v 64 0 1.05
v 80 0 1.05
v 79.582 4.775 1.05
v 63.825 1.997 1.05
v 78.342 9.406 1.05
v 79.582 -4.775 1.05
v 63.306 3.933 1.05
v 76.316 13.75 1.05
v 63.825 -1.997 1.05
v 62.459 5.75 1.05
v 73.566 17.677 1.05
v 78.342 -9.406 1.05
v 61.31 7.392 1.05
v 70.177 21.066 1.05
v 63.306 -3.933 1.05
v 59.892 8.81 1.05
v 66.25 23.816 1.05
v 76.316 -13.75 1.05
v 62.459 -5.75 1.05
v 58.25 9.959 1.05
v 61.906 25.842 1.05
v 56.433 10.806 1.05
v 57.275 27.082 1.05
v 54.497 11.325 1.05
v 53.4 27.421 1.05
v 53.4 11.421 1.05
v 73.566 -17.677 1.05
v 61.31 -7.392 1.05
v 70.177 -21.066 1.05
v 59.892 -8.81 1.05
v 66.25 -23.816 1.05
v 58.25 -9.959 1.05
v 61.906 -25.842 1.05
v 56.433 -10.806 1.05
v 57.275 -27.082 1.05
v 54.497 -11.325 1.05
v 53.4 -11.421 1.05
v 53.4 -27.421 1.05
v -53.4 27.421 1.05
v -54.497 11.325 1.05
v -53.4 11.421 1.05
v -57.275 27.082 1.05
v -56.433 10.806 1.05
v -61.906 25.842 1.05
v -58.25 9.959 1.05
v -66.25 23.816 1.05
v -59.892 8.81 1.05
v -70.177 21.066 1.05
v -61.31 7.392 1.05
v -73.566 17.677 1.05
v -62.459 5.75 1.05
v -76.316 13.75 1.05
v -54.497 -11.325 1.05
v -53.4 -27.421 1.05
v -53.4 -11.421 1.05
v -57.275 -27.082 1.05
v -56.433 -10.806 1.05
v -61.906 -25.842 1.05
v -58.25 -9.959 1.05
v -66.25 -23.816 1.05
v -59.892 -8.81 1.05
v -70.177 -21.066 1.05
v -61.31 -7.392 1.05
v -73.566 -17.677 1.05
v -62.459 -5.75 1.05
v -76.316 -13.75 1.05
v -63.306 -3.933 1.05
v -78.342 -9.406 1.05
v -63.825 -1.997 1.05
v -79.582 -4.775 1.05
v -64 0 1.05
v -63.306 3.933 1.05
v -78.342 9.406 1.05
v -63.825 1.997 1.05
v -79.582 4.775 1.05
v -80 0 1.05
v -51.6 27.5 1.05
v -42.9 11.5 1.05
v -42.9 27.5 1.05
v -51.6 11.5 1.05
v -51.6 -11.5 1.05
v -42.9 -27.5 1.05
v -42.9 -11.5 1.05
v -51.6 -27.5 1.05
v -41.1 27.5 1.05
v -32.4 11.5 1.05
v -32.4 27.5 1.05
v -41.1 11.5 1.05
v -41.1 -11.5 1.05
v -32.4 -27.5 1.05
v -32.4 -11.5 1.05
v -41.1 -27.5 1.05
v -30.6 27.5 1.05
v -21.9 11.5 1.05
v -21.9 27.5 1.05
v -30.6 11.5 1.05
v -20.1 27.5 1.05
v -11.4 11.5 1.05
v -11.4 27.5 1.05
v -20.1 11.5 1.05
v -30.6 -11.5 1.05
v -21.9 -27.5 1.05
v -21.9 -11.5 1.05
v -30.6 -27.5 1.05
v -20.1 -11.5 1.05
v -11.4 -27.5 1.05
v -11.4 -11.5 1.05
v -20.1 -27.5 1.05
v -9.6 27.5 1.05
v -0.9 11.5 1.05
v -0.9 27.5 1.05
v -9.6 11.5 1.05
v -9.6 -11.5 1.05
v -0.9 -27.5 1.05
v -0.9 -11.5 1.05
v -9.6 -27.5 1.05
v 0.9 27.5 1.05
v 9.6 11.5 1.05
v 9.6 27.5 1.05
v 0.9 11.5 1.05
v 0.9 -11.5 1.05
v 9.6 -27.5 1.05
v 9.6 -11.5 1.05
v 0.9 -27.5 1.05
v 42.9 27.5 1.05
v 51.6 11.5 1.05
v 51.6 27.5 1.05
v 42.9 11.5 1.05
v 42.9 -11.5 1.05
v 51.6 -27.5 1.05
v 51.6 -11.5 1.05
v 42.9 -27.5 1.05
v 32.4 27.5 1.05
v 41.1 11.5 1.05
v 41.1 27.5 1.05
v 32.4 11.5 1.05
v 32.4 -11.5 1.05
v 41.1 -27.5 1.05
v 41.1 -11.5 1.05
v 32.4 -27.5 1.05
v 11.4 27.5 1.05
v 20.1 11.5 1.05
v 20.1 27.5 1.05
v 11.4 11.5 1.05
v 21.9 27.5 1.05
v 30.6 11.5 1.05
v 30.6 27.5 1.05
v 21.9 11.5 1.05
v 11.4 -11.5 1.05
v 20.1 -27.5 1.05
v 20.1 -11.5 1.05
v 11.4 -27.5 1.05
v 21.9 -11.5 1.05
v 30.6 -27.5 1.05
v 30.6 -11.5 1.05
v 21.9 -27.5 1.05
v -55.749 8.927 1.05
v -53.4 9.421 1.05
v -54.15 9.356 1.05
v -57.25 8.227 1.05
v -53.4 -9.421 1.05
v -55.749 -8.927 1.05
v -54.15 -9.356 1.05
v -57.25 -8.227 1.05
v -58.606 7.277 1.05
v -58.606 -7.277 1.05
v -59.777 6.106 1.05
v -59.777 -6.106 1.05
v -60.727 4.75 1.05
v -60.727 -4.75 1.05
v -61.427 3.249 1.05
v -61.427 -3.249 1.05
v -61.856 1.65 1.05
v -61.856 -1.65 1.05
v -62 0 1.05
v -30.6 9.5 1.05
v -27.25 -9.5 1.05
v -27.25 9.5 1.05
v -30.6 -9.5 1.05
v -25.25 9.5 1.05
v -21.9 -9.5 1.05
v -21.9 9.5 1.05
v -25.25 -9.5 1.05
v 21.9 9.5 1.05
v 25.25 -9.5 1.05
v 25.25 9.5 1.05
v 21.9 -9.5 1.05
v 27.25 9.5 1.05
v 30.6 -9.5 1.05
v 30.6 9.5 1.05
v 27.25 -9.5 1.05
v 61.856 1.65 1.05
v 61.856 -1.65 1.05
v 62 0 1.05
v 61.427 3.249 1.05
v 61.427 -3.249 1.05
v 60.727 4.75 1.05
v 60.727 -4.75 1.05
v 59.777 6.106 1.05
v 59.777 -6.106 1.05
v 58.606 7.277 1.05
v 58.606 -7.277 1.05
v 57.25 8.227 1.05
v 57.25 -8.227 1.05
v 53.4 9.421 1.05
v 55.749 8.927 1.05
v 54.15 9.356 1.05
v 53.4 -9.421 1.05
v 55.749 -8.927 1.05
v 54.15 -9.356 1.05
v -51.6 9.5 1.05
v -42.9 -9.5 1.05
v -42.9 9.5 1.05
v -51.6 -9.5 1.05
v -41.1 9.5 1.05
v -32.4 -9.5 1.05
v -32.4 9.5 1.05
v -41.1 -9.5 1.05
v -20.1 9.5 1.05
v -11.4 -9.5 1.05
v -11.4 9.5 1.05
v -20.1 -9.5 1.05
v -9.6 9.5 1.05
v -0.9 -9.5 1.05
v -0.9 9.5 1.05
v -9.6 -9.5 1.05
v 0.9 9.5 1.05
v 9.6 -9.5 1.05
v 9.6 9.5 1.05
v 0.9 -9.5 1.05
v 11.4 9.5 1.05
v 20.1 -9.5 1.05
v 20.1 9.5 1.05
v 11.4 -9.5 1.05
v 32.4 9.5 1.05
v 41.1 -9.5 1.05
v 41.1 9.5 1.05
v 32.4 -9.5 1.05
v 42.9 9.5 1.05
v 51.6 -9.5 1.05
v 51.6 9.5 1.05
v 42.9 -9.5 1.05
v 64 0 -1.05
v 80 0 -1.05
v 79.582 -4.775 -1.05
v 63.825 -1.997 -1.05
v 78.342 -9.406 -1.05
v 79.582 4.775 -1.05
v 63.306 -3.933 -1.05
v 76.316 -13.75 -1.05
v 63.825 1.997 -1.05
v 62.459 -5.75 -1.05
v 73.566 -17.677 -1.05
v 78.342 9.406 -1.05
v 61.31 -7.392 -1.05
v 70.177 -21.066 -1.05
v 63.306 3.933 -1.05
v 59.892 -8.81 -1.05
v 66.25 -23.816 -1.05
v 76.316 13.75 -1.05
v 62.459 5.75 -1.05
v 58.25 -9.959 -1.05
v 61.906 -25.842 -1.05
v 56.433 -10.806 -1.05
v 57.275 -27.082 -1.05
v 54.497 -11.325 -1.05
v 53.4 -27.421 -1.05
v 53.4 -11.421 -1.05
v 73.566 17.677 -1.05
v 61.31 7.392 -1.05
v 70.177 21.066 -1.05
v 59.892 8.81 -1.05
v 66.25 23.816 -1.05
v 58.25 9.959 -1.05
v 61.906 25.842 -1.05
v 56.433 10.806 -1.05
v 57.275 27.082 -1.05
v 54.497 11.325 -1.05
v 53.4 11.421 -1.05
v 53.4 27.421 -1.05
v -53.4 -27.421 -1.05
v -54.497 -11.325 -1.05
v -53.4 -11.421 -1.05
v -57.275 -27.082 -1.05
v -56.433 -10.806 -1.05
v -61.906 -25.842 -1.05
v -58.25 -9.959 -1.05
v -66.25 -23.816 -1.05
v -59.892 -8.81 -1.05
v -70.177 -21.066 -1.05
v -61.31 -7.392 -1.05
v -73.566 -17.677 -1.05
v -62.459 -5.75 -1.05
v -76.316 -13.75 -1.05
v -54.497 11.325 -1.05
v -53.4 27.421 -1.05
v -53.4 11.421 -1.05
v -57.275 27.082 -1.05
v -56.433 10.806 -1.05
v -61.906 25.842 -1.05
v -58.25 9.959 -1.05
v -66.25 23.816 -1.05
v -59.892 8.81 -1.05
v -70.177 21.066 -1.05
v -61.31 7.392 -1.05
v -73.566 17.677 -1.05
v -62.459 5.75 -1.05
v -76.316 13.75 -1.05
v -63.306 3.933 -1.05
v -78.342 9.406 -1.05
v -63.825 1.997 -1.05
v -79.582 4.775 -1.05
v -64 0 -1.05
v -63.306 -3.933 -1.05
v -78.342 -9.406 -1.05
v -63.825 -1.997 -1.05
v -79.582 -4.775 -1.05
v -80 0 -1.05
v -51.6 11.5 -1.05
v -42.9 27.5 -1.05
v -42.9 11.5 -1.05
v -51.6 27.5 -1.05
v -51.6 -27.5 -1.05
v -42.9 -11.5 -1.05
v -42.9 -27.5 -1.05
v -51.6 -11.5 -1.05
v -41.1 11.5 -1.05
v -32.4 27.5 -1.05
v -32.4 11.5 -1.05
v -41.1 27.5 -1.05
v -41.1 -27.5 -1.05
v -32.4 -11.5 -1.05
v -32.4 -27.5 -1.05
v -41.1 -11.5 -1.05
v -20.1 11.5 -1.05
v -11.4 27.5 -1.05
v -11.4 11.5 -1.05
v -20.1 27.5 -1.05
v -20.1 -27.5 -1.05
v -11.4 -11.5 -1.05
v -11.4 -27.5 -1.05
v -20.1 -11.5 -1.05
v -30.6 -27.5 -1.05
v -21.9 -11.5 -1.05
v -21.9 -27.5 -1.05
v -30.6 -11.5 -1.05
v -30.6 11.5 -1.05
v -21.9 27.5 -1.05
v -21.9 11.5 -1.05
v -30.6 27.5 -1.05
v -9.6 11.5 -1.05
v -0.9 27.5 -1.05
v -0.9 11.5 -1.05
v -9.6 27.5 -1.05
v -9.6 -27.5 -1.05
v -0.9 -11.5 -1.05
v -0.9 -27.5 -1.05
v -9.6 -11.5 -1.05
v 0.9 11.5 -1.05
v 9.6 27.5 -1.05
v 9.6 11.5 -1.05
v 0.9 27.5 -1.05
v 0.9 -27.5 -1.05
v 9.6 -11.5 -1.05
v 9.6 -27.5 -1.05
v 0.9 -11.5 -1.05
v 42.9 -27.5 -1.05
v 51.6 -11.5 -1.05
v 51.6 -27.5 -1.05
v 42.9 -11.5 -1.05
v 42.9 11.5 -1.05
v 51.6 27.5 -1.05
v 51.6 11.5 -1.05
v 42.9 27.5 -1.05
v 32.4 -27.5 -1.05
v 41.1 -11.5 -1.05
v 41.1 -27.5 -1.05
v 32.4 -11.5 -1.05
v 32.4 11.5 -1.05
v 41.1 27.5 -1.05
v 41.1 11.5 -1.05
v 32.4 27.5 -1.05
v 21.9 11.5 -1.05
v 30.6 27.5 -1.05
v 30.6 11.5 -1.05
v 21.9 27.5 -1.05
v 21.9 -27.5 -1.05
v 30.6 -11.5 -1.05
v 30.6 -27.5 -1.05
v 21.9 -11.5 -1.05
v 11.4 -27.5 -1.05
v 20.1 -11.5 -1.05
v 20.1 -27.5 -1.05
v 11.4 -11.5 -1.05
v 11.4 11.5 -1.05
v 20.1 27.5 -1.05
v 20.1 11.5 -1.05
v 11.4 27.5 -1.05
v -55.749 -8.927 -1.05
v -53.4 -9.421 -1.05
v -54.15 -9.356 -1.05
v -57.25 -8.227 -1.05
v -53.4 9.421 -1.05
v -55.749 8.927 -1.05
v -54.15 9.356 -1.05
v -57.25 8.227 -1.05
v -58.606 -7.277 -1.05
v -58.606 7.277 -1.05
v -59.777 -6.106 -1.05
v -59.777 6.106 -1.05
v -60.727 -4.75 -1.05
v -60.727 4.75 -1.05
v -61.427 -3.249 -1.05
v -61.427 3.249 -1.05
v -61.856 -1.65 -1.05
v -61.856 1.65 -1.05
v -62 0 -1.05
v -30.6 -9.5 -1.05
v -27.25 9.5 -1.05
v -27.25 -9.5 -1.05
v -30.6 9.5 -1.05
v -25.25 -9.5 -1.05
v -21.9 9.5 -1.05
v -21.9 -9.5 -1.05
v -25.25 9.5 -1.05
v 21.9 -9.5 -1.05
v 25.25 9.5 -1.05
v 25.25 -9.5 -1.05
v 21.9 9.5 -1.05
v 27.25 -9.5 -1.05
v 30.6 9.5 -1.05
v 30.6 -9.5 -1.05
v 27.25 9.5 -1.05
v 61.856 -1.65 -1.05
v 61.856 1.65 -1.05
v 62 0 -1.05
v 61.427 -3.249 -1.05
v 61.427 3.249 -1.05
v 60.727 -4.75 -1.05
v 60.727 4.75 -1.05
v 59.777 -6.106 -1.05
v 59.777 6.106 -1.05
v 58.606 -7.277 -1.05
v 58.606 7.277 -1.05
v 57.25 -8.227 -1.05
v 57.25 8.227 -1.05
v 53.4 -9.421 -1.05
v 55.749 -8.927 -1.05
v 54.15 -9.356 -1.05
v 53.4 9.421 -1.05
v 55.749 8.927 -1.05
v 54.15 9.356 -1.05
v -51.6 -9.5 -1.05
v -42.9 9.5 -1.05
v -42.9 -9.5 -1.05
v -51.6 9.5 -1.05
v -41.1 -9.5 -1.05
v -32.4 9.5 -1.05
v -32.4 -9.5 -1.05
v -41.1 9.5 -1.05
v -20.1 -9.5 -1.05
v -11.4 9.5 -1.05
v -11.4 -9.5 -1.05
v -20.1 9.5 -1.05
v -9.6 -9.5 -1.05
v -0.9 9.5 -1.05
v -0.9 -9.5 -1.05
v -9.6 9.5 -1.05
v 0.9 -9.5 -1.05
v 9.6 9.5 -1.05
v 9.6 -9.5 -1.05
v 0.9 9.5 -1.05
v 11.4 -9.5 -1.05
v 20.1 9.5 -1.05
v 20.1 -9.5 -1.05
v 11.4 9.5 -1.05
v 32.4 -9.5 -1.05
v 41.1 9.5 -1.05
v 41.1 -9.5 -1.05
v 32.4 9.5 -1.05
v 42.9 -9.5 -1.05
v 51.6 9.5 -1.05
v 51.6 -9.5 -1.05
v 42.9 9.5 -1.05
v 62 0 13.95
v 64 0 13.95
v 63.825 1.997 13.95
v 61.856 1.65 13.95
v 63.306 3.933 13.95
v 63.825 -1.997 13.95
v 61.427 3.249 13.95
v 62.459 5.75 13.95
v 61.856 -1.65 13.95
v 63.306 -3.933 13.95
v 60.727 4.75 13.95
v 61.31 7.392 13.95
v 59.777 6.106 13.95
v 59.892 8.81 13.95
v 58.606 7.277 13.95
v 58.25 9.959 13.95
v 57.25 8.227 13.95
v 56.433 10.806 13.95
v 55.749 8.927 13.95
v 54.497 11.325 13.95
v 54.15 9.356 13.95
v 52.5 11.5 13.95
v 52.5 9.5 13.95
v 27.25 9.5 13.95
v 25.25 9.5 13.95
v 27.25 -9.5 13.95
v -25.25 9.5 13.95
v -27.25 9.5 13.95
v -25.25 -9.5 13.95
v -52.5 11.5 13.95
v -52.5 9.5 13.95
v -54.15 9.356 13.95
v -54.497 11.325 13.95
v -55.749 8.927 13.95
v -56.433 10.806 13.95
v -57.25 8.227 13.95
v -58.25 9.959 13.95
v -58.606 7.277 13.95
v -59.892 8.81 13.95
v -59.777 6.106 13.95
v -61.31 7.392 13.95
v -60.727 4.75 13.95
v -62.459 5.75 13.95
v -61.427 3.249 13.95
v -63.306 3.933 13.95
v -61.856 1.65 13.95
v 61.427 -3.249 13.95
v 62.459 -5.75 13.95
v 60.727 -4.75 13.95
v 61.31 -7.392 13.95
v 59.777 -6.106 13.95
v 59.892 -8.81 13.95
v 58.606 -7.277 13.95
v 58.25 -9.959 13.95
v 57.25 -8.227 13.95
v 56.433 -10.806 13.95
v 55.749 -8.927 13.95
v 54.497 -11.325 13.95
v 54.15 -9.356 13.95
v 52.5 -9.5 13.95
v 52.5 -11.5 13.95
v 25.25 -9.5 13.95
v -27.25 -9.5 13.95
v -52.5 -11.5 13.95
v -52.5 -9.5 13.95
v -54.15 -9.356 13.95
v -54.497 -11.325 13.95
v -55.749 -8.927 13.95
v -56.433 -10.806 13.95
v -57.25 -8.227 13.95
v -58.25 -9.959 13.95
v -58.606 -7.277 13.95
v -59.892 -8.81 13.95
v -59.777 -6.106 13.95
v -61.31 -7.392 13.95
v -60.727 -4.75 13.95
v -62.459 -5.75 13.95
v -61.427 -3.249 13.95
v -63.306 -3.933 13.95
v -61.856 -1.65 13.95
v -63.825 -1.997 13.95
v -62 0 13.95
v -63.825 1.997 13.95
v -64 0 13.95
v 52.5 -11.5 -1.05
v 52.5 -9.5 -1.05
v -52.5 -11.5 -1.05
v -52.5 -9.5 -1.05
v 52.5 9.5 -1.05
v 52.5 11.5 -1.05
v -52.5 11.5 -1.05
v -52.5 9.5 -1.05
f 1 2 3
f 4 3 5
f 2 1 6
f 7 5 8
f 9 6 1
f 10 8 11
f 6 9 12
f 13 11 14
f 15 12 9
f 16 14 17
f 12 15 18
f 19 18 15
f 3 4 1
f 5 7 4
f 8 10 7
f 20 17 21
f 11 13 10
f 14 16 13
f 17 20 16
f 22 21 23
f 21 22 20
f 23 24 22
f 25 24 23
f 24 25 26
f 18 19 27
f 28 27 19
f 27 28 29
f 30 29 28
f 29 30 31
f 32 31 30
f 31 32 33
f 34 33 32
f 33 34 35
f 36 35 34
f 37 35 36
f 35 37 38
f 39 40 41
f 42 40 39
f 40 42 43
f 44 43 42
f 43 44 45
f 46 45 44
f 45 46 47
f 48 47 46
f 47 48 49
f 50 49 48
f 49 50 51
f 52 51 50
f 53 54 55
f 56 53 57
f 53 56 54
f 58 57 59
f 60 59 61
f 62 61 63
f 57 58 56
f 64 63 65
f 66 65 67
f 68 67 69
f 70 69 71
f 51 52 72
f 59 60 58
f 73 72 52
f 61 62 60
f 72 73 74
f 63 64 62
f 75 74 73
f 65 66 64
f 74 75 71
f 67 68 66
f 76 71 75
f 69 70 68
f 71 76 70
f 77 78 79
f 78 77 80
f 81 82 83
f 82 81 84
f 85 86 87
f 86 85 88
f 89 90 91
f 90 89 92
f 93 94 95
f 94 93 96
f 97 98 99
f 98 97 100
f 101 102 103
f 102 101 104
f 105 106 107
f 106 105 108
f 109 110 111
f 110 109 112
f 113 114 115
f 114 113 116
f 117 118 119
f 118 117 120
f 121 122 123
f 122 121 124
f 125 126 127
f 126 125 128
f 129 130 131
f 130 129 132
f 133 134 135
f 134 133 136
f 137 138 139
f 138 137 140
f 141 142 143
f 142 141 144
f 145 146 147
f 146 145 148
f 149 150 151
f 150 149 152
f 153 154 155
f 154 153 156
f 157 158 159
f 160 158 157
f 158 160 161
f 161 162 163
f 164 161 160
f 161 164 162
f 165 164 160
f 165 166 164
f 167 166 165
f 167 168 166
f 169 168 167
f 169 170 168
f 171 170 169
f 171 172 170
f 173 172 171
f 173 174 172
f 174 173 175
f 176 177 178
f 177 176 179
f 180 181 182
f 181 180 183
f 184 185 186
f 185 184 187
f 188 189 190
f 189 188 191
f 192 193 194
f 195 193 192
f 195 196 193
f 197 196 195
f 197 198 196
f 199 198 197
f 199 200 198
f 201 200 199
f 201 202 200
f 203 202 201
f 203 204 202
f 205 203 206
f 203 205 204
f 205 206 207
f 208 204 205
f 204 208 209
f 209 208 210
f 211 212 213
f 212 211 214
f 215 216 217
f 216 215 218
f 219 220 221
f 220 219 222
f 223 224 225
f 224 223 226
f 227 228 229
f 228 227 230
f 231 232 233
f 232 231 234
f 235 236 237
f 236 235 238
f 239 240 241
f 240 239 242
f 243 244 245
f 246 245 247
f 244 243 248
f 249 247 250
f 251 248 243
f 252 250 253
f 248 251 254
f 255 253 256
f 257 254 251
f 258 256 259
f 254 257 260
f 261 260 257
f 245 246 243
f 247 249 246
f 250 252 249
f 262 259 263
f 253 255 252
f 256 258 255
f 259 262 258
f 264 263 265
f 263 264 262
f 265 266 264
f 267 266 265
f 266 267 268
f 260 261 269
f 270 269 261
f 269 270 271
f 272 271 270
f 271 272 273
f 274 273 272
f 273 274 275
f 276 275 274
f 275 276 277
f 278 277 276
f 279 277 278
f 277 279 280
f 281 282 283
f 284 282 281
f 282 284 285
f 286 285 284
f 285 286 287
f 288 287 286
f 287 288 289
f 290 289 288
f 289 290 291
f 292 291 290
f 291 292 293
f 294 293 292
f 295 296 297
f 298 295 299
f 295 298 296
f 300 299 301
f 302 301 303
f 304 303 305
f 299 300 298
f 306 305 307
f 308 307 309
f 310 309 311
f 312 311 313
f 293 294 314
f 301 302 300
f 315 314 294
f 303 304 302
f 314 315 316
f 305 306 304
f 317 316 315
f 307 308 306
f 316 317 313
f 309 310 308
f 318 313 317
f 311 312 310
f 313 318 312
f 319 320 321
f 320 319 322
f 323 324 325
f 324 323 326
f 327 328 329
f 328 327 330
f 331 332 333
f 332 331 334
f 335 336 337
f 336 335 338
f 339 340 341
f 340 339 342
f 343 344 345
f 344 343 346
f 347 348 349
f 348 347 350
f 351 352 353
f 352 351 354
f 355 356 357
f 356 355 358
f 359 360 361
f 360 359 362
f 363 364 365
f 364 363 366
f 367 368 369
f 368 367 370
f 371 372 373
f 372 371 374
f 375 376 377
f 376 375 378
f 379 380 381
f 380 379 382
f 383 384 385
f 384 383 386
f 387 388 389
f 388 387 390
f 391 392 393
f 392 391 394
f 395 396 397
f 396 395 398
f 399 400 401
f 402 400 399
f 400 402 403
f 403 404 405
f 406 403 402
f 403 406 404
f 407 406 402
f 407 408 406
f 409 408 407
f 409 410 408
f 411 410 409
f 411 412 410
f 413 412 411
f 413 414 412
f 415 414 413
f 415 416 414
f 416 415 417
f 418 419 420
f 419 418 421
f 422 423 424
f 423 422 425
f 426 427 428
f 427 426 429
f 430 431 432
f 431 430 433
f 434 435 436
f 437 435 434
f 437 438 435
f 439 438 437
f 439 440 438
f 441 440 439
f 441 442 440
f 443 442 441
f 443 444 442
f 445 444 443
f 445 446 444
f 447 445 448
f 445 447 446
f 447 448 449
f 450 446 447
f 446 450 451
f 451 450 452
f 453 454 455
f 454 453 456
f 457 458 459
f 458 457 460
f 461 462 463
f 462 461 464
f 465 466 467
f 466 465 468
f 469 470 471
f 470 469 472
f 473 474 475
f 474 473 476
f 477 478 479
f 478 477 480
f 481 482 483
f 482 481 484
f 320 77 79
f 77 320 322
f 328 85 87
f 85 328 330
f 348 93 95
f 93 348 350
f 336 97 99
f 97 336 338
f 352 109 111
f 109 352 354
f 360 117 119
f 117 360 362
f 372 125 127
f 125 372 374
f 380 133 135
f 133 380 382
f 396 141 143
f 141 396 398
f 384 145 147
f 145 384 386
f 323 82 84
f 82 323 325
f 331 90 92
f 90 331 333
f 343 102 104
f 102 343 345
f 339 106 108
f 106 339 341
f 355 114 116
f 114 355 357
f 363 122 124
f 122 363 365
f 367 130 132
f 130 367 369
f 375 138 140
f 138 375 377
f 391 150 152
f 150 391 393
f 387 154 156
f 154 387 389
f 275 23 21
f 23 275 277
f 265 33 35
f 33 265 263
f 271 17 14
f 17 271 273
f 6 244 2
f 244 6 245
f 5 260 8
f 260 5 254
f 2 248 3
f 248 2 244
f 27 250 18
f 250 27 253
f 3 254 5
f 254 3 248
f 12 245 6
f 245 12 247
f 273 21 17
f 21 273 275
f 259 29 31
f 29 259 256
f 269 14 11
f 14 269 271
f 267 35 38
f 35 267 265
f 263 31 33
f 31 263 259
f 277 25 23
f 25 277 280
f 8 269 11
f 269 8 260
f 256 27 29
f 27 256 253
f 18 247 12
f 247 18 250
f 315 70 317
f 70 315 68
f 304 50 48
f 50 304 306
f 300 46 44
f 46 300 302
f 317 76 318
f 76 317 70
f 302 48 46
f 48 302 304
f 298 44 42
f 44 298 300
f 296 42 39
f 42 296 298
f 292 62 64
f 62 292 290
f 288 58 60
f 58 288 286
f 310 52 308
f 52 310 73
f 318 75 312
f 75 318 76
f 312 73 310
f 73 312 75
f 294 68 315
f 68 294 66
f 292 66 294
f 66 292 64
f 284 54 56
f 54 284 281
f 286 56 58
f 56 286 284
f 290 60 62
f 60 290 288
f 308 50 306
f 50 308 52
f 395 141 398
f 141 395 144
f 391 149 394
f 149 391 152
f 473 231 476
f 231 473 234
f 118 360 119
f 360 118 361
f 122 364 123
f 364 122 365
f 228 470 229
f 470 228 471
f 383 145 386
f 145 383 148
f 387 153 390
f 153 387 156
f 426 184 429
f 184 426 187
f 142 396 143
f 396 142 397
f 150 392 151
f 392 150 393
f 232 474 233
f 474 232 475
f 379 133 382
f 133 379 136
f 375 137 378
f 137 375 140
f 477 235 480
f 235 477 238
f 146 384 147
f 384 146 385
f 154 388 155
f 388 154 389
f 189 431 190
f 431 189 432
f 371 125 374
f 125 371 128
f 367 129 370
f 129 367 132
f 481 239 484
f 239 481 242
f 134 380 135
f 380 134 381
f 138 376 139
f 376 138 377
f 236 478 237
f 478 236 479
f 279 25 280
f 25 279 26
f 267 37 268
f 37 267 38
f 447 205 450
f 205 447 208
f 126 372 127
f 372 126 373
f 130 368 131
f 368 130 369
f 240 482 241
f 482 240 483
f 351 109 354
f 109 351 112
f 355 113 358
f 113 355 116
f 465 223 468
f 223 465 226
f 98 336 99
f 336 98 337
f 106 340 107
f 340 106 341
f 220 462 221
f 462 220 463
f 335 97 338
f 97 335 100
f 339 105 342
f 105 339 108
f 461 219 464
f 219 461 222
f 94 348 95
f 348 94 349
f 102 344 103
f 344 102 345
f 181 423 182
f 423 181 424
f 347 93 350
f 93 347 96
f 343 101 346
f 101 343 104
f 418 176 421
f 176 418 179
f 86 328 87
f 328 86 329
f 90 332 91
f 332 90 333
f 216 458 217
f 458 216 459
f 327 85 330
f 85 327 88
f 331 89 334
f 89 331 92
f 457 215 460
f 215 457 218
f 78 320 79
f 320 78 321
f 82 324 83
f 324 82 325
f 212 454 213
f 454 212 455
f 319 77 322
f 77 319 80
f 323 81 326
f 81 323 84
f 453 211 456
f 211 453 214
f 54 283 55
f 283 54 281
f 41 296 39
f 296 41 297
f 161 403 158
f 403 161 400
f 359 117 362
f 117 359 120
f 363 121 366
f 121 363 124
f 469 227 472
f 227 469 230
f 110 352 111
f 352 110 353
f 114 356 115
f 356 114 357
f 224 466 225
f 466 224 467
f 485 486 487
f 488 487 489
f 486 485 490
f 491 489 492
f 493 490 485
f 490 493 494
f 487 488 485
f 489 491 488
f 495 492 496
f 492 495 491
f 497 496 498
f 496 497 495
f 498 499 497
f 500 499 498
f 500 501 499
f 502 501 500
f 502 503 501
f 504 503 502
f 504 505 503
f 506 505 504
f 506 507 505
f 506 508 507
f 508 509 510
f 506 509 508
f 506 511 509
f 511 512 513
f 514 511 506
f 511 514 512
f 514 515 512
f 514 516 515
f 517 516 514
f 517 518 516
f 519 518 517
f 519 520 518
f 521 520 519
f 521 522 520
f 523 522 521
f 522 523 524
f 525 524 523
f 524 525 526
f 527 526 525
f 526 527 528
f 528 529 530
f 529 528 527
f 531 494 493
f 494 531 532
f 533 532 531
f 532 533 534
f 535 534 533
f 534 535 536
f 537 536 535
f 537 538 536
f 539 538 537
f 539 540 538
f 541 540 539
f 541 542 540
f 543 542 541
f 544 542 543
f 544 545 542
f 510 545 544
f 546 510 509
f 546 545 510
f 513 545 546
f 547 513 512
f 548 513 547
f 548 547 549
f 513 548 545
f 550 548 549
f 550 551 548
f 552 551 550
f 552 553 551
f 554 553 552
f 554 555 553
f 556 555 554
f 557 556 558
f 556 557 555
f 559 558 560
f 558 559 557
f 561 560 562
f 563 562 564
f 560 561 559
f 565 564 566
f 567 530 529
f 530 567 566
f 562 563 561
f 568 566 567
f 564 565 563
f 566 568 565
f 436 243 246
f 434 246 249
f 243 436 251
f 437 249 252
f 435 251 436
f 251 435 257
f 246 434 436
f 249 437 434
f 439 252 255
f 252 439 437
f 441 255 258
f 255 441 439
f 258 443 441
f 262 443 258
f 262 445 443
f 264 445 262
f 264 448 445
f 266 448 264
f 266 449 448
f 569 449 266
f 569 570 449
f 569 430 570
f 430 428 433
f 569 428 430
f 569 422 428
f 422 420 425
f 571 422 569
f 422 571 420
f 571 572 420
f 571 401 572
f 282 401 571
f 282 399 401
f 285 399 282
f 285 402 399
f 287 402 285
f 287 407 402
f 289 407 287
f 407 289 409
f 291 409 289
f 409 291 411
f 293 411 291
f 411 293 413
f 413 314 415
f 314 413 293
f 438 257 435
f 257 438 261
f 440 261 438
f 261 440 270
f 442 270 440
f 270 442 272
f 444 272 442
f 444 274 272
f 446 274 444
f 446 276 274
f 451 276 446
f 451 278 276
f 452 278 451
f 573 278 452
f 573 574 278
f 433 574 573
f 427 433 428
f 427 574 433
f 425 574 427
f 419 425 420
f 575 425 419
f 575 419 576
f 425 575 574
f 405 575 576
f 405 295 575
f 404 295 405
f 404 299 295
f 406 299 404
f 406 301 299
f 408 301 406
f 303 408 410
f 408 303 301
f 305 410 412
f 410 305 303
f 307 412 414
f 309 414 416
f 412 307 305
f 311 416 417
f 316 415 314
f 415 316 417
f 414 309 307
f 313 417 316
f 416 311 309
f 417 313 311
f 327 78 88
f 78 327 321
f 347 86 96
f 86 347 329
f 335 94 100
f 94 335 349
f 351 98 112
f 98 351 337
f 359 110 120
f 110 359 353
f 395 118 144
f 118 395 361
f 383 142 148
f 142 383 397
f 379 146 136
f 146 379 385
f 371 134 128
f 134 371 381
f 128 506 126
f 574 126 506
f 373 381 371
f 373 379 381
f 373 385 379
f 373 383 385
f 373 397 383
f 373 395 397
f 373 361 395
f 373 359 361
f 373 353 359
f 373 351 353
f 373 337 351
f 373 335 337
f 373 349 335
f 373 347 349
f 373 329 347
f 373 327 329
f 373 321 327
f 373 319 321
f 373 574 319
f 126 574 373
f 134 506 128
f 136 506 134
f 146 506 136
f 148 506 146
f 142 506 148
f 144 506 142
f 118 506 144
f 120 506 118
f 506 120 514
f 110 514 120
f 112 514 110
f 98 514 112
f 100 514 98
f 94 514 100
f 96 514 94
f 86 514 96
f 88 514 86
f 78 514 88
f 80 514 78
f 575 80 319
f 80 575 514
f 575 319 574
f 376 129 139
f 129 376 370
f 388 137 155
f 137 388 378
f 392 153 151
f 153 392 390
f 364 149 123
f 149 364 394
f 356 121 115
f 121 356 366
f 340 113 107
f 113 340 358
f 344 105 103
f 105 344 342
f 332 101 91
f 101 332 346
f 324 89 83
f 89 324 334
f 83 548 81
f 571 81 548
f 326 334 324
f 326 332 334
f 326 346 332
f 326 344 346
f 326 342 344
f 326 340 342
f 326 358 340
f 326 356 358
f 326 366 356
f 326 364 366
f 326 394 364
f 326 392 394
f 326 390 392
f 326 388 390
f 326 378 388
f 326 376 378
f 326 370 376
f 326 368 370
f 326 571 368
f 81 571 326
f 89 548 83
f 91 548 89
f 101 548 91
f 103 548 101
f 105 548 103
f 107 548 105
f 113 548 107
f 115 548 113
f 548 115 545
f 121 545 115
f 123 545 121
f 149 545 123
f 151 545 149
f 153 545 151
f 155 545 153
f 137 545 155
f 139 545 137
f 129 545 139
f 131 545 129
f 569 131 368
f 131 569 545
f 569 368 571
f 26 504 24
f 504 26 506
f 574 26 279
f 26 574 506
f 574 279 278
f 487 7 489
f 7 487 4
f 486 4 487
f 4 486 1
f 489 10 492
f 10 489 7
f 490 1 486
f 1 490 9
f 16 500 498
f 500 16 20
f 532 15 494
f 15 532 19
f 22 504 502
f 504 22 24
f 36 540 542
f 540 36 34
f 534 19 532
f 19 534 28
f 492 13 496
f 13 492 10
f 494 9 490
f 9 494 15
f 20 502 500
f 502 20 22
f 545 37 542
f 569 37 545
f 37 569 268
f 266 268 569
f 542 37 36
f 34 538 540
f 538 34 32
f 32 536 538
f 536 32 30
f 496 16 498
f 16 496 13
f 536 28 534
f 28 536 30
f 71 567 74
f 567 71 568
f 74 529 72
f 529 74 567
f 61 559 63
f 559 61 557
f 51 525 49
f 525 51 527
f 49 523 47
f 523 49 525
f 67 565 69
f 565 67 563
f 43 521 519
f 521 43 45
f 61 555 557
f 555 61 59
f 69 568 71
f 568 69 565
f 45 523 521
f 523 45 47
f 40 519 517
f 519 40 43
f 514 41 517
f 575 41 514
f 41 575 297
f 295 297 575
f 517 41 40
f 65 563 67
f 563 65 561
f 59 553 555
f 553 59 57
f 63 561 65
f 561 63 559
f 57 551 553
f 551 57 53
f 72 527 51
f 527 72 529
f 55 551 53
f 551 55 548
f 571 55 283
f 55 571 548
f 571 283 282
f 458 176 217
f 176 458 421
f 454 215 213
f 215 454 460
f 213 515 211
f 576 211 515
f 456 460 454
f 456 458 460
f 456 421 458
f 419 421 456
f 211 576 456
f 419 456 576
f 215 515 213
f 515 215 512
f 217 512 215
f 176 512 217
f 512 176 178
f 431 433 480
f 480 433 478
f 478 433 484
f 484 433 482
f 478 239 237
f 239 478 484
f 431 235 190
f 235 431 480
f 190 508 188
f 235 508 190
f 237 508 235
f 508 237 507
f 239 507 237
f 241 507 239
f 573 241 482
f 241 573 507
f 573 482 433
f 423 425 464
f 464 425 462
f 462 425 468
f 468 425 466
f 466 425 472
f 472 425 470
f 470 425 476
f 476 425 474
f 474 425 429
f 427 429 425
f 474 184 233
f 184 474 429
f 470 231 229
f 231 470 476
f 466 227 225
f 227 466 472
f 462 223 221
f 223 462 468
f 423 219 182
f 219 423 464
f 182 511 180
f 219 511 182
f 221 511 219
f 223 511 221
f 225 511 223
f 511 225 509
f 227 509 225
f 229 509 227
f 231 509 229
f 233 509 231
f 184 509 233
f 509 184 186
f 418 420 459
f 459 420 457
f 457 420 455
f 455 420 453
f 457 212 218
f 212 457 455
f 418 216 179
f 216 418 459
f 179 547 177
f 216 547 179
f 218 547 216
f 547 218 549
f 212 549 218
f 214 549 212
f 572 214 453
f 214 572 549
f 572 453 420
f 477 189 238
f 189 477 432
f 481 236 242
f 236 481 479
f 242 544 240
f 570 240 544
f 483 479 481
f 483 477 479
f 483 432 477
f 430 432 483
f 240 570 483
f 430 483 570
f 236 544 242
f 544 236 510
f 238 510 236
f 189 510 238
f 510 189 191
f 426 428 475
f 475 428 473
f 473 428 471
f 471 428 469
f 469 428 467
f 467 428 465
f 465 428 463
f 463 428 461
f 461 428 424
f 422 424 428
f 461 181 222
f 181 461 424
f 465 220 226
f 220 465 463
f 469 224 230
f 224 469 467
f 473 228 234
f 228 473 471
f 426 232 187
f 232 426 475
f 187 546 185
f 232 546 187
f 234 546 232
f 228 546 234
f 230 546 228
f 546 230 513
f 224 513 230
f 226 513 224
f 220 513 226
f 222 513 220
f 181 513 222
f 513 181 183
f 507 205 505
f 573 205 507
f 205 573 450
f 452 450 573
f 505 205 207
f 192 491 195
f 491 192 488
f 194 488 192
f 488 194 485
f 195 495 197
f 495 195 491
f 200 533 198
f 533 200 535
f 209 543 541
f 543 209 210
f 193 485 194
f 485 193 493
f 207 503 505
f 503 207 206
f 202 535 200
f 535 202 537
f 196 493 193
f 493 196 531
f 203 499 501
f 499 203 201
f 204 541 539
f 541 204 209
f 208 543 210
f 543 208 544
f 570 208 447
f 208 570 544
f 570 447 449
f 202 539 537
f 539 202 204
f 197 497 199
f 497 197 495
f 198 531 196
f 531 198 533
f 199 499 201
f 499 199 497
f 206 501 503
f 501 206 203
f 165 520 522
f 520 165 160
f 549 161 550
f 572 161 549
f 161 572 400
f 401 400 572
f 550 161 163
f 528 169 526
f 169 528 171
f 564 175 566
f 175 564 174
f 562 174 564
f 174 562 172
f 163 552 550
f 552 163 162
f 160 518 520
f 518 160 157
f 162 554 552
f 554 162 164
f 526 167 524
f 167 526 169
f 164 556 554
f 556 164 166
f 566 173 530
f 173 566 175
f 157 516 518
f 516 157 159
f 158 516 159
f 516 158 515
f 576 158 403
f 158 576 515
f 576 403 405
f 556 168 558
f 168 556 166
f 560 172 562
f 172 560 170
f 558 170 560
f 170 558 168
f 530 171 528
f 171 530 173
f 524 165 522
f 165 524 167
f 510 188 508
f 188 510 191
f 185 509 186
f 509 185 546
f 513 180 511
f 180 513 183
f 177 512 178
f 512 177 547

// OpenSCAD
/*[Hole]*/
hole_length=130.0;
hole_width=25.0;
/*[Cover]*/
extend_distance=15.0;//[10.0,15.0,20.0]
cover_thickness=2.1;//[1.8,2.1,2.4,2.7]
slit_width=1.8;//[1.5,1.8,2.1]
num_slit=11;//[9,11,13,15,17,19]
/*[Frame]*/
//gap between wall and frame (mm)
gap=1.0;//[0.5,1.0,1.5,2.0,2.5]
frame_thickness=2.0;//[1.5,2.0,2.5]
frame_height=15.0;//[10.0,15.0,20.0]

module cover0(hole_length,hole_width,extend_distance,cover_thickness){
color("blue")
cube(size=[hole_length-hole_width,hole_width+2*extend_distance,cover_thickness],center=true); 

color("blue")
translate([(hole_length-hole_width)/2,0,0])
cylinder(cover_thickness,(hole_width+2*extend_distance)/2,(hole_width+2*extend_distance)/2,$fn=36,center=true);

color("blue")
translate([-(hole_length-hole_width)/2,0,0])
cylinder(cover_thickness,(hole_width+2*extend_distance)/2,(hole_width+2*extend_distance)/2,$fn=36,center=true);
}

module slits(hole_length,hole_width,extend_distance,slit_width,num_slit,cover_thickness){
color("green")
cube(size=[slit_width,hole_width+2*extend_distance,cover_thickness],center=true); 
dx=(hole_length-hole_width)/(num_slit-1);
ni=(num_slit-1)/2;

for(i=[1:ni])
color("green")
translate([i*dx,0,0])
cube(size=[slit_width,hole_width+2*extend_distance,cover_thickness],center=true); 

for(i=[1:ni])
color("green")
translate([-i*dx,0,0])
cube(size=[slit_width,hole_width+2*extend_distance,cover_thickness],center=true); 
}






module frame0(hole_length,hole_width,gap,frame_height){
color("red")
cube(size=[hole_length-hole_width,hole_width-2*gap,frame_height],center=true); 
color("red")
translate([(hole_length-hole_width)/2,0,0])
cylinder(frame_height,(hole_width-2*gap)/2,(hole_width-2*gap)/2,$fn=36,center=true);
color("red")
translate([-(hole_length-hole_width)/2,0,0])
cylinder(frame_height,(hole_width-2*gap)/2,(hole_width-2*gap)/2,$fn=36,center=true);
}



module frame1(hole_length,hole_width,gap,frame_thickness,frame_height){
color("yellow")
cube(size=[hole_length-hole_width,hole_width-2*gap-2*frame_thickness,frame_height],center=true); 
color("yellow")
translate([(hole_length-hole_width)/2,0,0])
cylinder(frame_height,(hole_width-2*gap-2*frame_thickness)/2,(hole_width-2*gap-2*frame_thickness)/2,$fn=36,center=true);
color("yellow")
translate([-(hole_length-hole_width)/2,0,0])
cylinder(frame_height,(hole_width-2*gap-2*frame_thickness)/2,(hole_width-2*gap-2*frame_thickness)/2,$fn=36,center=true);
}

module frame2(hole_length,hole_width,gap,frame_thickness,frame_height){
color("yellow")
translate([(hole_length-hole_width)/4,0,0])
cube(size=[frame_thickness,hole_width,frame_height],center=true); 
translate([-(hole_length-hole_width)/4,0,0])
cube(size=[frame_thickness,hole_width,frame_height],center=true); 

}

union(){
difference(){
cover0(hole_length,hole_width,extend_distance,cover_thickness);
slits(hole_length,hole_width,extend_distance,slit_width,num_slit,cover_thickness);
}
translate([0,0,(frame_height-cover_thickness)/2])
difference(){
frame0(hole_length,hole_width,gap,frame_height);
difference(){
frame1(hole_length,hole_width,gap,frame_thickness,frame_height);
frame2(hole_length,hole_width,gap,frame_thickness,frame_height);
}
}
}
